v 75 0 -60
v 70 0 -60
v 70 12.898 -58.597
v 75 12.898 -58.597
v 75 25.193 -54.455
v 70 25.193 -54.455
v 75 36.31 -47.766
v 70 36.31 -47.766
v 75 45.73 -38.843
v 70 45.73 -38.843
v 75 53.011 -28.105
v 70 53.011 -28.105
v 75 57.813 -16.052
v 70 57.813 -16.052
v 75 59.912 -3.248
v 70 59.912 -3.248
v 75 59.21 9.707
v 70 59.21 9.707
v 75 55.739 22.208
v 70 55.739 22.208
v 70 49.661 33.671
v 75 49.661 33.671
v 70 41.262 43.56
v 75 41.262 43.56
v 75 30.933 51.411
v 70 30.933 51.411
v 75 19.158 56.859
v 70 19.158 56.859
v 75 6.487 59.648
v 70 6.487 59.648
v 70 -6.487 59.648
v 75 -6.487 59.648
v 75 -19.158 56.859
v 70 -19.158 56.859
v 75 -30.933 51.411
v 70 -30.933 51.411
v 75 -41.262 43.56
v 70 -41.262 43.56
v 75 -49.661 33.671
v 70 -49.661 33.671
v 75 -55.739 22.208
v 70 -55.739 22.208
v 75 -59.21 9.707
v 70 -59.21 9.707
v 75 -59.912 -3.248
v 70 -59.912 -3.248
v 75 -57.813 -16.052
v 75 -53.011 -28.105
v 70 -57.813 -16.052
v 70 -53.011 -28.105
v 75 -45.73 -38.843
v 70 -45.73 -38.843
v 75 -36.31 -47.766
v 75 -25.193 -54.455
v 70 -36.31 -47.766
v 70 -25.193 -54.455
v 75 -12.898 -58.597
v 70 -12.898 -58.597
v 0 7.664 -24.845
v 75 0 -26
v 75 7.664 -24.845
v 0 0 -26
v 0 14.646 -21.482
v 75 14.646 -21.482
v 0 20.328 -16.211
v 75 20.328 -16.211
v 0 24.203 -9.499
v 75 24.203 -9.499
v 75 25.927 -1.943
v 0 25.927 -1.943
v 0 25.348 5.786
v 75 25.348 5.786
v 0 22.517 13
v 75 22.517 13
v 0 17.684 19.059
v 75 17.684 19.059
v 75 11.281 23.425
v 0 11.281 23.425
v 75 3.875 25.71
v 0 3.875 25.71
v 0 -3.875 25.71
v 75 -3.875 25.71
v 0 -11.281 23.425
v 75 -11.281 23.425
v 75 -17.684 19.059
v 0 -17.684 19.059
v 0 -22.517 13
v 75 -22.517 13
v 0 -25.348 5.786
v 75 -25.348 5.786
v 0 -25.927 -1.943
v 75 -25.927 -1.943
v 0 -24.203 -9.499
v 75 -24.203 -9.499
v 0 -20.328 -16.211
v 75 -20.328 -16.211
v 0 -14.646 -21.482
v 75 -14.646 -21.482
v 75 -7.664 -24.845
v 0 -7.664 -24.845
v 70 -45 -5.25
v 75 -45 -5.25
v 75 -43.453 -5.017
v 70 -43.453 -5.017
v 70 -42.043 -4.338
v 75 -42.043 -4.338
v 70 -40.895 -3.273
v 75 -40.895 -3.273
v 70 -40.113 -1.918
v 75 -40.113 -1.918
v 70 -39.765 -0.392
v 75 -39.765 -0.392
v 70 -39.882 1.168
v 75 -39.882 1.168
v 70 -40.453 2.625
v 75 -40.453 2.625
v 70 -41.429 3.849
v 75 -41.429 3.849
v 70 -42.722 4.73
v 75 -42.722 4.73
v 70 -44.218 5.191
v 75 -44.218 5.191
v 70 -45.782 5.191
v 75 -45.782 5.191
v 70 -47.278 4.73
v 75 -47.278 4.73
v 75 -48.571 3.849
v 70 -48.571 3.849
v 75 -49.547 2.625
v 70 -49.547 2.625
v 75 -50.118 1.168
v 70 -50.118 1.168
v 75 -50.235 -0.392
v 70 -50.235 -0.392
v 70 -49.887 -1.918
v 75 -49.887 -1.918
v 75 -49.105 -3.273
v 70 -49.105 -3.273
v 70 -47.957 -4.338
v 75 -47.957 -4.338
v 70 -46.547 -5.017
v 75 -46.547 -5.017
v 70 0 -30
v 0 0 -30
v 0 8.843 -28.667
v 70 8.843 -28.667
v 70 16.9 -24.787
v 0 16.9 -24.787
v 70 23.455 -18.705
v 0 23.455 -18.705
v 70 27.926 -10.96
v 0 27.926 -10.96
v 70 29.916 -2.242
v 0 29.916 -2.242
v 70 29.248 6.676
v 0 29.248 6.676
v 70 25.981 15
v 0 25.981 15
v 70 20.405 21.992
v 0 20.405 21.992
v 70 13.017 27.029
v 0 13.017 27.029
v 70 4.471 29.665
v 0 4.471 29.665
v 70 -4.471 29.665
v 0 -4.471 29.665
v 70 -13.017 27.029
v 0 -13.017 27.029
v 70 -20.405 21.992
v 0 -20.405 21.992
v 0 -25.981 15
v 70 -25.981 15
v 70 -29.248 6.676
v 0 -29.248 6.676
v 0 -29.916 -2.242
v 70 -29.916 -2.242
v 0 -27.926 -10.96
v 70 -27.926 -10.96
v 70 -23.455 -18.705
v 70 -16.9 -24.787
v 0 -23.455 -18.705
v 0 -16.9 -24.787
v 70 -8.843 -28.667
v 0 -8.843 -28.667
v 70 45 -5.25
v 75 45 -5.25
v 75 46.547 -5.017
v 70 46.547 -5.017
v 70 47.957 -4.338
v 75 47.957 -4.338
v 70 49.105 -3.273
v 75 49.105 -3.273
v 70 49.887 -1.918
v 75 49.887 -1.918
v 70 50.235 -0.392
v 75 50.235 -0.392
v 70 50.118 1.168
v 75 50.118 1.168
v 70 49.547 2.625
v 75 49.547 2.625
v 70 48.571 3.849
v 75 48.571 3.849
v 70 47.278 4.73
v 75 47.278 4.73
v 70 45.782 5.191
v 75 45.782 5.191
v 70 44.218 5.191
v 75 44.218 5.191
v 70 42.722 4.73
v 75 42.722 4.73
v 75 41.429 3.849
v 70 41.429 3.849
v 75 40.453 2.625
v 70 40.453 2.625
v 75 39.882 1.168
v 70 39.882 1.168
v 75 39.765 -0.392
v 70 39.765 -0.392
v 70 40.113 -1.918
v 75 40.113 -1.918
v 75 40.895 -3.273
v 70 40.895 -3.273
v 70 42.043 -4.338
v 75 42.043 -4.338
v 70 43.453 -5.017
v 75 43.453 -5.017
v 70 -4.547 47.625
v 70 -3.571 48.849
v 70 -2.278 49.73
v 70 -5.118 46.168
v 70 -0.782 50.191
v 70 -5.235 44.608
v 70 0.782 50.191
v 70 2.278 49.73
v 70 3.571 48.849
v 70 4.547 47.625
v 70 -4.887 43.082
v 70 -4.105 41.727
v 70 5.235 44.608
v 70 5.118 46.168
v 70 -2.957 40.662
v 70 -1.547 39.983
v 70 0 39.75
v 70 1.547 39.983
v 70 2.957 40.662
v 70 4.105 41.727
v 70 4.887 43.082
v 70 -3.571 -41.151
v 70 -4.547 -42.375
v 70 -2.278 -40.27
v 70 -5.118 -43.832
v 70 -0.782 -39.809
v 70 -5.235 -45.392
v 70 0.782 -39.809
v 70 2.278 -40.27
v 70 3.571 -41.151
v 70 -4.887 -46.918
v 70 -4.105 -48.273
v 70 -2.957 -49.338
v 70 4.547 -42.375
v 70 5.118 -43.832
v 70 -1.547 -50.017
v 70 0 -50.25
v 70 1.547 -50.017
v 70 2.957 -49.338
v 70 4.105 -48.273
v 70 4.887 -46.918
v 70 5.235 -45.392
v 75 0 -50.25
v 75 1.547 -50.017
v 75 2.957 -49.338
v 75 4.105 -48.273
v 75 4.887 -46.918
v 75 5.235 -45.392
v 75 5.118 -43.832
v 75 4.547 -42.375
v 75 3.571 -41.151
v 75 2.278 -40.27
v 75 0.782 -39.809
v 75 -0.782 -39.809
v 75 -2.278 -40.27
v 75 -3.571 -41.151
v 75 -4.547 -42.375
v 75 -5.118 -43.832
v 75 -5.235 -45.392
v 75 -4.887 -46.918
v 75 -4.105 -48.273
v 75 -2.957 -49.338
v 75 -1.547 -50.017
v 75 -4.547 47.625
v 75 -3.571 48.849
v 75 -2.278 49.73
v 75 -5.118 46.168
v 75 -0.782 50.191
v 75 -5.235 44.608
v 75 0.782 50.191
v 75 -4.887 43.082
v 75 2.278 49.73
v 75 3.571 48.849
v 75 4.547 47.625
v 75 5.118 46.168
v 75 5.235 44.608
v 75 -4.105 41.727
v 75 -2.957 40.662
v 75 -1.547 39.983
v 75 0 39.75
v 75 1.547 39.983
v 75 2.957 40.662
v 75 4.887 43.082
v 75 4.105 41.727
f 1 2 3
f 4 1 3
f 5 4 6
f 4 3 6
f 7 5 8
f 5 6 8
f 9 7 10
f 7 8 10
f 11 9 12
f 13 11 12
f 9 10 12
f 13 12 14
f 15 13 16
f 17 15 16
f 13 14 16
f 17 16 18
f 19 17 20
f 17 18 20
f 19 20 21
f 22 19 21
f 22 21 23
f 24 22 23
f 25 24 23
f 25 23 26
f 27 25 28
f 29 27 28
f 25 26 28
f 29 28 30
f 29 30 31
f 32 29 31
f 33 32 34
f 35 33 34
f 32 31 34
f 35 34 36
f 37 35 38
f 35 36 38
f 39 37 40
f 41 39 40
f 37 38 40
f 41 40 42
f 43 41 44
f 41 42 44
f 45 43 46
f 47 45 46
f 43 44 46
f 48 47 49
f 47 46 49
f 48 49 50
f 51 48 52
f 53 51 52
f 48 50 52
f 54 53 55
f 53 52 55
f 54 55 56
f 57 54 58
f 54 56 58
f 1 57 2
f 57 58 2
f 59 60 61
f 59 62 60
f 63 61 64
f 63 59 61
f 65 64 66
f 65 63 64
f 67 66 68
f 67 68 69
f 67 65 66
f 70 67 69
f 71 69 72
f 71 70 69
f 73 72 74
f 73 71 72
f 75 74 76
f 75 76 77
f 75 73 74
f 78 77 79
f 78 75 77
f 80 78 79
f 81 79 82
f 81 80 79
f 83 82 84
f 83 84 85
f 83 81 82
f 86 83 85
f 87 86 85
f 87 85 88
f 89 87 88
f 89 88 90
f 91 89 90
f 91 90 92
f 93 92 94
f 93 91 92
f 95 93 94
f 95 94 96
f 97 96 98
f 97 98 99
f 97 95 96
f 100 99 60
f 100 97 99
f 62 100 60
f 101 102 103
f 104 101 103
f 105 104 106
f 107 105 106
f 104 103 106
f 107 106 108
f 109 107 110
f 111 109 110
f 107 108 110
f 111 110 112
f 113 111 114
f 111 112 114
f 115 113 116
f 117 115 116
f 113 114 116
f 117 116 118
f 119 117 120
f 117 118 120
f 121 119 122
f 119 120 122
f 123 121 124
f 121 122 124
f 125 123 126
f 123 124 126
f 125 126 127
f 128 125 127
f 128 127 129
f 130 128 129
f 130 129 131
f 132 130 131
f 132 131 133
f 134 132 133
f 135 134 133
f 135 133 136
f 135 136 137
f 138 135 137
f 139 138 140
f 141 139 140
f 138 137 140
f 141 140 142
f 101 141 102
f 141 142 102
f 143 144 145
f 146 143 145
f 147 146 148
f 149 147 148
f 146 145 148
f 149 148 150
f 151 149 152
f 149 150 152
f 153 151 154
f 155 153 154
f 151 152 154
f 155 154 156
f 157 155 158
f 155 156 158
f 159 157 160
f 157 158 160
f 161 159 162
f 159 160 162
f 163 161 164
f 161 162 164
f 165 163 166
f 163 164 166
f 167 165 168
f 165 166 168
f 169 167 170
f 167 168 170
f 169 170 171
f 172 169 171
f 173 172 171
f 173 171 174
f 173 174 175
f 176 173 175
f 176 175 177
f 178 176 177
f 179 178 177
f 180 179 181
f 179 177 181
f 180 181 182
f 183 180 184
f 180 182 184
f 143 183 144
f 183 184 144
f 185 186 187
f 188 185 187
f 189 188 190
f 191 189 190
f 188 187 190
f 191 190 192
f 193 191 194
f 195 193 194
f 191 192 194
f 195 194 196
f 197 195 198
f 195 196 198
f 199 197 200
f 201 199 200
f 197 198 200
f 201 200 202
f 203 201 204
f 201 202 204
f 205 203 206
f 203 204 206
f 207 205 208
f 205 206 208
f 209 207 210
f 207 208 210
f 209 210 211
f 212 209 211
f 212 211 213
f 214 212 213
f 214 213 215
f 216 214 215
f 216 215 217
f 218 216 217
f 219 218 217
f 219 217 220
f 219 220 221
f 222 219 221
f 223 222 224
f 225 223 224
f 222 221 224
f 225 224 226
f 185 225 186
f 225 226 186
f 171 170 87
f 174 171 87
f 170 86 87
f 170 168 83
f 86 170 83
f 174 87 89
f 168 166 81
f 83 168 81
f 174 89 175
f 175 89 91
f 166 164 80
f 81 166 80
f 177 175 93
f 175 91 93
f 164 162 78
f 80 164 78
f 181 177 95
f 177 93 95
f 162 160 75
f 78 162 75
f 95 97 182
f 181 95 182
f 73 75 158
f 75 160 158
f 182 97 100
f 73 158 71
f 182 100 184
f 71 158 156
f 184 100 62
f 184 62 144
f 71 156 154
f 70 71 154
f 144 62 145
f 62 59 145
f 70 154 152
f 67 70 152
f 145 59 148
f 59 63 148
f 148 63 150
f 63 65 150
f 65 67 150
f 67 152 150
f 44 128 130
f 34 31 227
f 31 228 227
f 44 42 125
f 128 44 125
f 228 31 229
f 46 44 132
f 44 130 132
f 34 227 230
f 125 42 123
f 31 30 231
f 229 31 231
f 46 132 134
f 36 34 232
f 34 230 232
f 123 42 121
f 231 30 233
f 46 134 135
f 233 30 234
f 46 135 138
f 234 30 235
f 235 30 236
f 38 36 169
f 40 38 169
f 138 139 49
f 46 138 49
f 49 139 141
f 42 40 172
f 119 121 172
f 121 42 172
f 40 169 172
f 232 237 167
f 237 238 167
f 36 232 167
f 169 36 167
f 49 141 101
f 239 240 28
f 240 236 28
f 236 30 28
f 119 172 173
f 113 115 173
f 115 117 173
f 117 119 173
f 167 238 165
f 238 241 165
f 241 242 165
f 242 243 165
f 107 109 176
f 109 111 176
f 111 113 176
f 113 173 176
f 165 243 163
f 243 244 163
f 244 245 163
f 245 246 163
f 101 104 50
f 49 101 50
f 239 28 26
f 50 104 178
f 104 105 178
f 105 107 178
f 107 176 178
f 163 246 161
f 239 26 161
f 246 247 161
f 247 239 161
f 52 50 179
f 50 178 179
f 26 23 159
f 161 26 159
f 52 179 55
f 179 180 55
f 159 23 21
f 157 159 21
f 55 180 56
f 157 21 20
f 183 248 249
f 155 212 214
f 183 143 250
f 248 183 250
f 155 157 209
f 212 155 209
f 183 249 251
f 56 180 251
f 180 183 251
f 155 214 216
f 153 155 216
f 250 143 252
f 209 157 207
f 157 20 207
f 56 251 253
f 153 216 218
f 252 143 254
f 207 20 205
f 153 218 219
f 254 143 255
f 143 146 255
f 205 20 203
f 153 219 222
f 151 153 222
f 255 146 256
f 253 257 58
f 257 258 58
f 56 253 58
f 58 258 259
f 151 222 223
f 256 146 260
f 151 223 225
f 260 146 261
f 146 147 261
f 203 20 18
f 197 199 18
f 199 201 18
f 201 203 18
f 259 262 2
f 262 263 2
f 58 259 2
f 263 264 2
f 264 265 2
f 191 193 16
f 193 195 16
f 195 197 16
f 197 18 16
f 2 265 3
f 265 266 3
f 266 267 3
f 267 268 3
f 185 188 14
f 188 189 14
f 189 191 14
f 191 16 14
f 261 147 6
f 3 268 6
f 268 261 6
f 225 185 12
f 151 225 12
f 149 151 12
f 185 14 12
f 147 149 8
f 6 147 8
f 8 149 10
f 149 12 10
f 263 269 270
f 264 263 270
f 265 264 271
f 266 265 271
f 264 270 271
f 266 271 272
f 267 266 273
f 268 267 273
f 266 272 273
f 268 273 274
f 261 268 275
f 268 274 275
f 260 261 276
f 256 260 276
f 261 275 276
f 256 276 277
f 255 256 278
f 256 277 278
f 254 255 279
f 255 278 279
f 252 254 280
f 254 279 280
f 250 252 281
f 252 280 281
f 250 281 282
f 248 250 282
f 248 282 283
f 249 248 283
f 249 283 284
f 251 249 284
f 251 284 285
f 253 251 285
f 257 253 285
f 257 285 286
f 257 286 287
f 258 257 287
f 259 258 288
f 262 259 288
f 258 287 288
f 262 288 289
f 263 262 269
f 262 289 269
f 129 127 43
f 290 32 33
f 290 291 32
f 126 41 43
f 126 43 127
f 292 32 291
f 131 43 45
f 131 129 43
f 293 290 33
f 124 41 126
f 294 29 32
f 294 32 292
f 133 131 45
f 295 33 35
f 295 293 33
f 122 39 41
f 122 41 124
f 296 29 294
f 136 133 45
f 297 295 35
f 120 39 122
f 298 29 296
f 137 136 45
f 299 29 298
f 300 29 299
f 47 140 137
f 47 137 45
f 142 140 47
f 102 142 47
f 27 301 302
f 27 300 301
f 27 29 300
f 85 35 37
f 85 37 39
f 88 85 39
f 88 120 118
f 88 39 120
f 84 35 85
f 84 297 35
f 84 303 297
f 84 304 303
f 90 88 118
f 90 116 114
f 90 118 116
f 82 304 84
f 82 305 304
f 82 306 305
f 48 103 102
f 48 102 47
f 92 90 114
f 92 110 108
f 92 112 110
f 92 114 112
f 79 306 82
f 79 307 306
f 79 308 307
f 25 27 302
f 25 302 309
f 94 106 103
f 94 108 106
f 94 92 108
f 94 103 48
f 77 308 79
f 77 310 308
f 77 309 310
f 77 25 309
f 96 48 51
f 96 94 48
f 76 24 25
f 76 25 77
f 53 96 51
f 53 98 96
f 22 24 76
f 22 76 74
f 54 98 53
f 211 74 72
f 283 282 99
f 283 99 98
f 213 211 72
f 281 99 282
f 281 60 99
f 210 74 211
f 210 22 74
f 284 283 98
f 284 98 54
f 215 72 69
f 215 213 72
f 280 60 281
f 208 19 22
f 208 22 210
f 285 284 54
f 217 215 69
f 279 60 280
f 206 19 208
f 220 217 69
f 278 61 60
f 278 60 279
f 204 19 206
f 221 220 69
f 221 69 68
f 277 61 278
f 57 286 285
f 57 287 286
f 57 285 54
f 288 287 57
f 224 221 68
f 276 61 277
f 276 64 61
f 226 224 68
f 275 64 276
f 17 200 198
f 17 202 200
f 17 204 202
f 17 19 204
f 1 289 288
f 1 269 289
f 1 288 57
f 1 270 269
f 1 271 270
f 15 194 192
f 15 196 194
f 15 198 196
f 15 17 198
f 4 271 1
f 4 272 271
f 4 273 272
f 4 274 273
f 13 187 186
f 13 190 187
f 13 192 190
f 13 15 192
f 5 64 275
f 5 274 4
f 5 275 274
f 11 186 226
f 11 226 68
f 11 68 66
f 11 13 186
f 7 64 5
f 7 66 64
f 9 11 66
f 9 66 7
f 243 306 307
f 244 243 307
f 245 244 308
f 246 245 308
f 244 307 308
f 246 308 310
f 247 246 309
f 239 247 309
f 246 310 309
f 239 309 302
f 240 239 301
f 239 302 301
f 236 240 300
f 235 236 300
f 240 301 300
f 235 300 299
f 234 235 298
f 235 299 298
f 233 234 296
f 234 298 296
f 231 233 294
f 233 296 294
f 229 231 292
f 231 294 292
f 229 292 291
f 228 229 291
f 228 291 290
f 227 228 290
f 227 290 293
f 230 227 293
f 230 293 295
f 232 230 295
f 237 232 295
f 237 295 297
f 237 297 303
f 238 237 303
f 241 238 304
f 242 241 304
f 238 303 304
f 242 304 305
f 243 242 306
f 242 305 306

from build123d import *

# Parameters (mm, degrees)
SZKIC1_R                    = 30
SZKIC1_R_2                  = 26
DODANIE_WYCI_GNI_CIE1_DEPTH = 70
SZKIC2_R                    = 60
SZKIC2_R_2                  = 26
DODANIE_WYCI_GNI_CIE2_DEPTH = 5
SZKIC3_R                    = 5.25
WYTNIJ_WYCI_GNI_CIE1_DEPTH  = 5


with BuildPart() as part:
    # Szkic1 → Dodanie-wyciągnięcie1 (new body)
    with BuildSketch(Plane(origin=(0, 0, 0), x_dir=(0, 0, -1), z_dir=(1, 0, 0))):
        Circle(SZKIC1_R)
        Circle(SZKIC1_R_2, mode=Mode.SUBTRACT)
    extrude(amount=DODANIE_WYCI_GNI_CIE1_DEPTH)

    # Szkic2 → Dodanie-wyciągnięcie2 (add)
    with BuildSketch(Plane(origin=(70, 0, 0), x_dir=(0, 0, -1), z_dir=(1, 0, 0))):
        Circle(SZKIC2_R)
        Circle(SZKIC2_R_2, mode=Mode.SUBTRACT)
    extrude(amount=DODANIE_WYCI_GNI_CIE2_DEPTH)

    # Szkic3 → Wytnij-wyciągnięcie1 (cut)
    with BuildSketch(Plane(origin=(75, 0, 0), x_dir=(0, 0, -1), z_dir=(1, 0, 0))):
        with Locations((-45, 0)):
            Circle(SZKIC3_R)
        with Locations((45, 0)):
            Circle(SZKIC3_R)
        with Locations((0, -45)):
            Circle(SZKIC3_R)
        with Locations((0, 45)):
            Circle(SZKIC3_R)
    extrude(amount=-WYTNIJ_WYCI_GNI_CIE1_DEPTH, mode=Mode.SUBTRACT)


solid = part.part
